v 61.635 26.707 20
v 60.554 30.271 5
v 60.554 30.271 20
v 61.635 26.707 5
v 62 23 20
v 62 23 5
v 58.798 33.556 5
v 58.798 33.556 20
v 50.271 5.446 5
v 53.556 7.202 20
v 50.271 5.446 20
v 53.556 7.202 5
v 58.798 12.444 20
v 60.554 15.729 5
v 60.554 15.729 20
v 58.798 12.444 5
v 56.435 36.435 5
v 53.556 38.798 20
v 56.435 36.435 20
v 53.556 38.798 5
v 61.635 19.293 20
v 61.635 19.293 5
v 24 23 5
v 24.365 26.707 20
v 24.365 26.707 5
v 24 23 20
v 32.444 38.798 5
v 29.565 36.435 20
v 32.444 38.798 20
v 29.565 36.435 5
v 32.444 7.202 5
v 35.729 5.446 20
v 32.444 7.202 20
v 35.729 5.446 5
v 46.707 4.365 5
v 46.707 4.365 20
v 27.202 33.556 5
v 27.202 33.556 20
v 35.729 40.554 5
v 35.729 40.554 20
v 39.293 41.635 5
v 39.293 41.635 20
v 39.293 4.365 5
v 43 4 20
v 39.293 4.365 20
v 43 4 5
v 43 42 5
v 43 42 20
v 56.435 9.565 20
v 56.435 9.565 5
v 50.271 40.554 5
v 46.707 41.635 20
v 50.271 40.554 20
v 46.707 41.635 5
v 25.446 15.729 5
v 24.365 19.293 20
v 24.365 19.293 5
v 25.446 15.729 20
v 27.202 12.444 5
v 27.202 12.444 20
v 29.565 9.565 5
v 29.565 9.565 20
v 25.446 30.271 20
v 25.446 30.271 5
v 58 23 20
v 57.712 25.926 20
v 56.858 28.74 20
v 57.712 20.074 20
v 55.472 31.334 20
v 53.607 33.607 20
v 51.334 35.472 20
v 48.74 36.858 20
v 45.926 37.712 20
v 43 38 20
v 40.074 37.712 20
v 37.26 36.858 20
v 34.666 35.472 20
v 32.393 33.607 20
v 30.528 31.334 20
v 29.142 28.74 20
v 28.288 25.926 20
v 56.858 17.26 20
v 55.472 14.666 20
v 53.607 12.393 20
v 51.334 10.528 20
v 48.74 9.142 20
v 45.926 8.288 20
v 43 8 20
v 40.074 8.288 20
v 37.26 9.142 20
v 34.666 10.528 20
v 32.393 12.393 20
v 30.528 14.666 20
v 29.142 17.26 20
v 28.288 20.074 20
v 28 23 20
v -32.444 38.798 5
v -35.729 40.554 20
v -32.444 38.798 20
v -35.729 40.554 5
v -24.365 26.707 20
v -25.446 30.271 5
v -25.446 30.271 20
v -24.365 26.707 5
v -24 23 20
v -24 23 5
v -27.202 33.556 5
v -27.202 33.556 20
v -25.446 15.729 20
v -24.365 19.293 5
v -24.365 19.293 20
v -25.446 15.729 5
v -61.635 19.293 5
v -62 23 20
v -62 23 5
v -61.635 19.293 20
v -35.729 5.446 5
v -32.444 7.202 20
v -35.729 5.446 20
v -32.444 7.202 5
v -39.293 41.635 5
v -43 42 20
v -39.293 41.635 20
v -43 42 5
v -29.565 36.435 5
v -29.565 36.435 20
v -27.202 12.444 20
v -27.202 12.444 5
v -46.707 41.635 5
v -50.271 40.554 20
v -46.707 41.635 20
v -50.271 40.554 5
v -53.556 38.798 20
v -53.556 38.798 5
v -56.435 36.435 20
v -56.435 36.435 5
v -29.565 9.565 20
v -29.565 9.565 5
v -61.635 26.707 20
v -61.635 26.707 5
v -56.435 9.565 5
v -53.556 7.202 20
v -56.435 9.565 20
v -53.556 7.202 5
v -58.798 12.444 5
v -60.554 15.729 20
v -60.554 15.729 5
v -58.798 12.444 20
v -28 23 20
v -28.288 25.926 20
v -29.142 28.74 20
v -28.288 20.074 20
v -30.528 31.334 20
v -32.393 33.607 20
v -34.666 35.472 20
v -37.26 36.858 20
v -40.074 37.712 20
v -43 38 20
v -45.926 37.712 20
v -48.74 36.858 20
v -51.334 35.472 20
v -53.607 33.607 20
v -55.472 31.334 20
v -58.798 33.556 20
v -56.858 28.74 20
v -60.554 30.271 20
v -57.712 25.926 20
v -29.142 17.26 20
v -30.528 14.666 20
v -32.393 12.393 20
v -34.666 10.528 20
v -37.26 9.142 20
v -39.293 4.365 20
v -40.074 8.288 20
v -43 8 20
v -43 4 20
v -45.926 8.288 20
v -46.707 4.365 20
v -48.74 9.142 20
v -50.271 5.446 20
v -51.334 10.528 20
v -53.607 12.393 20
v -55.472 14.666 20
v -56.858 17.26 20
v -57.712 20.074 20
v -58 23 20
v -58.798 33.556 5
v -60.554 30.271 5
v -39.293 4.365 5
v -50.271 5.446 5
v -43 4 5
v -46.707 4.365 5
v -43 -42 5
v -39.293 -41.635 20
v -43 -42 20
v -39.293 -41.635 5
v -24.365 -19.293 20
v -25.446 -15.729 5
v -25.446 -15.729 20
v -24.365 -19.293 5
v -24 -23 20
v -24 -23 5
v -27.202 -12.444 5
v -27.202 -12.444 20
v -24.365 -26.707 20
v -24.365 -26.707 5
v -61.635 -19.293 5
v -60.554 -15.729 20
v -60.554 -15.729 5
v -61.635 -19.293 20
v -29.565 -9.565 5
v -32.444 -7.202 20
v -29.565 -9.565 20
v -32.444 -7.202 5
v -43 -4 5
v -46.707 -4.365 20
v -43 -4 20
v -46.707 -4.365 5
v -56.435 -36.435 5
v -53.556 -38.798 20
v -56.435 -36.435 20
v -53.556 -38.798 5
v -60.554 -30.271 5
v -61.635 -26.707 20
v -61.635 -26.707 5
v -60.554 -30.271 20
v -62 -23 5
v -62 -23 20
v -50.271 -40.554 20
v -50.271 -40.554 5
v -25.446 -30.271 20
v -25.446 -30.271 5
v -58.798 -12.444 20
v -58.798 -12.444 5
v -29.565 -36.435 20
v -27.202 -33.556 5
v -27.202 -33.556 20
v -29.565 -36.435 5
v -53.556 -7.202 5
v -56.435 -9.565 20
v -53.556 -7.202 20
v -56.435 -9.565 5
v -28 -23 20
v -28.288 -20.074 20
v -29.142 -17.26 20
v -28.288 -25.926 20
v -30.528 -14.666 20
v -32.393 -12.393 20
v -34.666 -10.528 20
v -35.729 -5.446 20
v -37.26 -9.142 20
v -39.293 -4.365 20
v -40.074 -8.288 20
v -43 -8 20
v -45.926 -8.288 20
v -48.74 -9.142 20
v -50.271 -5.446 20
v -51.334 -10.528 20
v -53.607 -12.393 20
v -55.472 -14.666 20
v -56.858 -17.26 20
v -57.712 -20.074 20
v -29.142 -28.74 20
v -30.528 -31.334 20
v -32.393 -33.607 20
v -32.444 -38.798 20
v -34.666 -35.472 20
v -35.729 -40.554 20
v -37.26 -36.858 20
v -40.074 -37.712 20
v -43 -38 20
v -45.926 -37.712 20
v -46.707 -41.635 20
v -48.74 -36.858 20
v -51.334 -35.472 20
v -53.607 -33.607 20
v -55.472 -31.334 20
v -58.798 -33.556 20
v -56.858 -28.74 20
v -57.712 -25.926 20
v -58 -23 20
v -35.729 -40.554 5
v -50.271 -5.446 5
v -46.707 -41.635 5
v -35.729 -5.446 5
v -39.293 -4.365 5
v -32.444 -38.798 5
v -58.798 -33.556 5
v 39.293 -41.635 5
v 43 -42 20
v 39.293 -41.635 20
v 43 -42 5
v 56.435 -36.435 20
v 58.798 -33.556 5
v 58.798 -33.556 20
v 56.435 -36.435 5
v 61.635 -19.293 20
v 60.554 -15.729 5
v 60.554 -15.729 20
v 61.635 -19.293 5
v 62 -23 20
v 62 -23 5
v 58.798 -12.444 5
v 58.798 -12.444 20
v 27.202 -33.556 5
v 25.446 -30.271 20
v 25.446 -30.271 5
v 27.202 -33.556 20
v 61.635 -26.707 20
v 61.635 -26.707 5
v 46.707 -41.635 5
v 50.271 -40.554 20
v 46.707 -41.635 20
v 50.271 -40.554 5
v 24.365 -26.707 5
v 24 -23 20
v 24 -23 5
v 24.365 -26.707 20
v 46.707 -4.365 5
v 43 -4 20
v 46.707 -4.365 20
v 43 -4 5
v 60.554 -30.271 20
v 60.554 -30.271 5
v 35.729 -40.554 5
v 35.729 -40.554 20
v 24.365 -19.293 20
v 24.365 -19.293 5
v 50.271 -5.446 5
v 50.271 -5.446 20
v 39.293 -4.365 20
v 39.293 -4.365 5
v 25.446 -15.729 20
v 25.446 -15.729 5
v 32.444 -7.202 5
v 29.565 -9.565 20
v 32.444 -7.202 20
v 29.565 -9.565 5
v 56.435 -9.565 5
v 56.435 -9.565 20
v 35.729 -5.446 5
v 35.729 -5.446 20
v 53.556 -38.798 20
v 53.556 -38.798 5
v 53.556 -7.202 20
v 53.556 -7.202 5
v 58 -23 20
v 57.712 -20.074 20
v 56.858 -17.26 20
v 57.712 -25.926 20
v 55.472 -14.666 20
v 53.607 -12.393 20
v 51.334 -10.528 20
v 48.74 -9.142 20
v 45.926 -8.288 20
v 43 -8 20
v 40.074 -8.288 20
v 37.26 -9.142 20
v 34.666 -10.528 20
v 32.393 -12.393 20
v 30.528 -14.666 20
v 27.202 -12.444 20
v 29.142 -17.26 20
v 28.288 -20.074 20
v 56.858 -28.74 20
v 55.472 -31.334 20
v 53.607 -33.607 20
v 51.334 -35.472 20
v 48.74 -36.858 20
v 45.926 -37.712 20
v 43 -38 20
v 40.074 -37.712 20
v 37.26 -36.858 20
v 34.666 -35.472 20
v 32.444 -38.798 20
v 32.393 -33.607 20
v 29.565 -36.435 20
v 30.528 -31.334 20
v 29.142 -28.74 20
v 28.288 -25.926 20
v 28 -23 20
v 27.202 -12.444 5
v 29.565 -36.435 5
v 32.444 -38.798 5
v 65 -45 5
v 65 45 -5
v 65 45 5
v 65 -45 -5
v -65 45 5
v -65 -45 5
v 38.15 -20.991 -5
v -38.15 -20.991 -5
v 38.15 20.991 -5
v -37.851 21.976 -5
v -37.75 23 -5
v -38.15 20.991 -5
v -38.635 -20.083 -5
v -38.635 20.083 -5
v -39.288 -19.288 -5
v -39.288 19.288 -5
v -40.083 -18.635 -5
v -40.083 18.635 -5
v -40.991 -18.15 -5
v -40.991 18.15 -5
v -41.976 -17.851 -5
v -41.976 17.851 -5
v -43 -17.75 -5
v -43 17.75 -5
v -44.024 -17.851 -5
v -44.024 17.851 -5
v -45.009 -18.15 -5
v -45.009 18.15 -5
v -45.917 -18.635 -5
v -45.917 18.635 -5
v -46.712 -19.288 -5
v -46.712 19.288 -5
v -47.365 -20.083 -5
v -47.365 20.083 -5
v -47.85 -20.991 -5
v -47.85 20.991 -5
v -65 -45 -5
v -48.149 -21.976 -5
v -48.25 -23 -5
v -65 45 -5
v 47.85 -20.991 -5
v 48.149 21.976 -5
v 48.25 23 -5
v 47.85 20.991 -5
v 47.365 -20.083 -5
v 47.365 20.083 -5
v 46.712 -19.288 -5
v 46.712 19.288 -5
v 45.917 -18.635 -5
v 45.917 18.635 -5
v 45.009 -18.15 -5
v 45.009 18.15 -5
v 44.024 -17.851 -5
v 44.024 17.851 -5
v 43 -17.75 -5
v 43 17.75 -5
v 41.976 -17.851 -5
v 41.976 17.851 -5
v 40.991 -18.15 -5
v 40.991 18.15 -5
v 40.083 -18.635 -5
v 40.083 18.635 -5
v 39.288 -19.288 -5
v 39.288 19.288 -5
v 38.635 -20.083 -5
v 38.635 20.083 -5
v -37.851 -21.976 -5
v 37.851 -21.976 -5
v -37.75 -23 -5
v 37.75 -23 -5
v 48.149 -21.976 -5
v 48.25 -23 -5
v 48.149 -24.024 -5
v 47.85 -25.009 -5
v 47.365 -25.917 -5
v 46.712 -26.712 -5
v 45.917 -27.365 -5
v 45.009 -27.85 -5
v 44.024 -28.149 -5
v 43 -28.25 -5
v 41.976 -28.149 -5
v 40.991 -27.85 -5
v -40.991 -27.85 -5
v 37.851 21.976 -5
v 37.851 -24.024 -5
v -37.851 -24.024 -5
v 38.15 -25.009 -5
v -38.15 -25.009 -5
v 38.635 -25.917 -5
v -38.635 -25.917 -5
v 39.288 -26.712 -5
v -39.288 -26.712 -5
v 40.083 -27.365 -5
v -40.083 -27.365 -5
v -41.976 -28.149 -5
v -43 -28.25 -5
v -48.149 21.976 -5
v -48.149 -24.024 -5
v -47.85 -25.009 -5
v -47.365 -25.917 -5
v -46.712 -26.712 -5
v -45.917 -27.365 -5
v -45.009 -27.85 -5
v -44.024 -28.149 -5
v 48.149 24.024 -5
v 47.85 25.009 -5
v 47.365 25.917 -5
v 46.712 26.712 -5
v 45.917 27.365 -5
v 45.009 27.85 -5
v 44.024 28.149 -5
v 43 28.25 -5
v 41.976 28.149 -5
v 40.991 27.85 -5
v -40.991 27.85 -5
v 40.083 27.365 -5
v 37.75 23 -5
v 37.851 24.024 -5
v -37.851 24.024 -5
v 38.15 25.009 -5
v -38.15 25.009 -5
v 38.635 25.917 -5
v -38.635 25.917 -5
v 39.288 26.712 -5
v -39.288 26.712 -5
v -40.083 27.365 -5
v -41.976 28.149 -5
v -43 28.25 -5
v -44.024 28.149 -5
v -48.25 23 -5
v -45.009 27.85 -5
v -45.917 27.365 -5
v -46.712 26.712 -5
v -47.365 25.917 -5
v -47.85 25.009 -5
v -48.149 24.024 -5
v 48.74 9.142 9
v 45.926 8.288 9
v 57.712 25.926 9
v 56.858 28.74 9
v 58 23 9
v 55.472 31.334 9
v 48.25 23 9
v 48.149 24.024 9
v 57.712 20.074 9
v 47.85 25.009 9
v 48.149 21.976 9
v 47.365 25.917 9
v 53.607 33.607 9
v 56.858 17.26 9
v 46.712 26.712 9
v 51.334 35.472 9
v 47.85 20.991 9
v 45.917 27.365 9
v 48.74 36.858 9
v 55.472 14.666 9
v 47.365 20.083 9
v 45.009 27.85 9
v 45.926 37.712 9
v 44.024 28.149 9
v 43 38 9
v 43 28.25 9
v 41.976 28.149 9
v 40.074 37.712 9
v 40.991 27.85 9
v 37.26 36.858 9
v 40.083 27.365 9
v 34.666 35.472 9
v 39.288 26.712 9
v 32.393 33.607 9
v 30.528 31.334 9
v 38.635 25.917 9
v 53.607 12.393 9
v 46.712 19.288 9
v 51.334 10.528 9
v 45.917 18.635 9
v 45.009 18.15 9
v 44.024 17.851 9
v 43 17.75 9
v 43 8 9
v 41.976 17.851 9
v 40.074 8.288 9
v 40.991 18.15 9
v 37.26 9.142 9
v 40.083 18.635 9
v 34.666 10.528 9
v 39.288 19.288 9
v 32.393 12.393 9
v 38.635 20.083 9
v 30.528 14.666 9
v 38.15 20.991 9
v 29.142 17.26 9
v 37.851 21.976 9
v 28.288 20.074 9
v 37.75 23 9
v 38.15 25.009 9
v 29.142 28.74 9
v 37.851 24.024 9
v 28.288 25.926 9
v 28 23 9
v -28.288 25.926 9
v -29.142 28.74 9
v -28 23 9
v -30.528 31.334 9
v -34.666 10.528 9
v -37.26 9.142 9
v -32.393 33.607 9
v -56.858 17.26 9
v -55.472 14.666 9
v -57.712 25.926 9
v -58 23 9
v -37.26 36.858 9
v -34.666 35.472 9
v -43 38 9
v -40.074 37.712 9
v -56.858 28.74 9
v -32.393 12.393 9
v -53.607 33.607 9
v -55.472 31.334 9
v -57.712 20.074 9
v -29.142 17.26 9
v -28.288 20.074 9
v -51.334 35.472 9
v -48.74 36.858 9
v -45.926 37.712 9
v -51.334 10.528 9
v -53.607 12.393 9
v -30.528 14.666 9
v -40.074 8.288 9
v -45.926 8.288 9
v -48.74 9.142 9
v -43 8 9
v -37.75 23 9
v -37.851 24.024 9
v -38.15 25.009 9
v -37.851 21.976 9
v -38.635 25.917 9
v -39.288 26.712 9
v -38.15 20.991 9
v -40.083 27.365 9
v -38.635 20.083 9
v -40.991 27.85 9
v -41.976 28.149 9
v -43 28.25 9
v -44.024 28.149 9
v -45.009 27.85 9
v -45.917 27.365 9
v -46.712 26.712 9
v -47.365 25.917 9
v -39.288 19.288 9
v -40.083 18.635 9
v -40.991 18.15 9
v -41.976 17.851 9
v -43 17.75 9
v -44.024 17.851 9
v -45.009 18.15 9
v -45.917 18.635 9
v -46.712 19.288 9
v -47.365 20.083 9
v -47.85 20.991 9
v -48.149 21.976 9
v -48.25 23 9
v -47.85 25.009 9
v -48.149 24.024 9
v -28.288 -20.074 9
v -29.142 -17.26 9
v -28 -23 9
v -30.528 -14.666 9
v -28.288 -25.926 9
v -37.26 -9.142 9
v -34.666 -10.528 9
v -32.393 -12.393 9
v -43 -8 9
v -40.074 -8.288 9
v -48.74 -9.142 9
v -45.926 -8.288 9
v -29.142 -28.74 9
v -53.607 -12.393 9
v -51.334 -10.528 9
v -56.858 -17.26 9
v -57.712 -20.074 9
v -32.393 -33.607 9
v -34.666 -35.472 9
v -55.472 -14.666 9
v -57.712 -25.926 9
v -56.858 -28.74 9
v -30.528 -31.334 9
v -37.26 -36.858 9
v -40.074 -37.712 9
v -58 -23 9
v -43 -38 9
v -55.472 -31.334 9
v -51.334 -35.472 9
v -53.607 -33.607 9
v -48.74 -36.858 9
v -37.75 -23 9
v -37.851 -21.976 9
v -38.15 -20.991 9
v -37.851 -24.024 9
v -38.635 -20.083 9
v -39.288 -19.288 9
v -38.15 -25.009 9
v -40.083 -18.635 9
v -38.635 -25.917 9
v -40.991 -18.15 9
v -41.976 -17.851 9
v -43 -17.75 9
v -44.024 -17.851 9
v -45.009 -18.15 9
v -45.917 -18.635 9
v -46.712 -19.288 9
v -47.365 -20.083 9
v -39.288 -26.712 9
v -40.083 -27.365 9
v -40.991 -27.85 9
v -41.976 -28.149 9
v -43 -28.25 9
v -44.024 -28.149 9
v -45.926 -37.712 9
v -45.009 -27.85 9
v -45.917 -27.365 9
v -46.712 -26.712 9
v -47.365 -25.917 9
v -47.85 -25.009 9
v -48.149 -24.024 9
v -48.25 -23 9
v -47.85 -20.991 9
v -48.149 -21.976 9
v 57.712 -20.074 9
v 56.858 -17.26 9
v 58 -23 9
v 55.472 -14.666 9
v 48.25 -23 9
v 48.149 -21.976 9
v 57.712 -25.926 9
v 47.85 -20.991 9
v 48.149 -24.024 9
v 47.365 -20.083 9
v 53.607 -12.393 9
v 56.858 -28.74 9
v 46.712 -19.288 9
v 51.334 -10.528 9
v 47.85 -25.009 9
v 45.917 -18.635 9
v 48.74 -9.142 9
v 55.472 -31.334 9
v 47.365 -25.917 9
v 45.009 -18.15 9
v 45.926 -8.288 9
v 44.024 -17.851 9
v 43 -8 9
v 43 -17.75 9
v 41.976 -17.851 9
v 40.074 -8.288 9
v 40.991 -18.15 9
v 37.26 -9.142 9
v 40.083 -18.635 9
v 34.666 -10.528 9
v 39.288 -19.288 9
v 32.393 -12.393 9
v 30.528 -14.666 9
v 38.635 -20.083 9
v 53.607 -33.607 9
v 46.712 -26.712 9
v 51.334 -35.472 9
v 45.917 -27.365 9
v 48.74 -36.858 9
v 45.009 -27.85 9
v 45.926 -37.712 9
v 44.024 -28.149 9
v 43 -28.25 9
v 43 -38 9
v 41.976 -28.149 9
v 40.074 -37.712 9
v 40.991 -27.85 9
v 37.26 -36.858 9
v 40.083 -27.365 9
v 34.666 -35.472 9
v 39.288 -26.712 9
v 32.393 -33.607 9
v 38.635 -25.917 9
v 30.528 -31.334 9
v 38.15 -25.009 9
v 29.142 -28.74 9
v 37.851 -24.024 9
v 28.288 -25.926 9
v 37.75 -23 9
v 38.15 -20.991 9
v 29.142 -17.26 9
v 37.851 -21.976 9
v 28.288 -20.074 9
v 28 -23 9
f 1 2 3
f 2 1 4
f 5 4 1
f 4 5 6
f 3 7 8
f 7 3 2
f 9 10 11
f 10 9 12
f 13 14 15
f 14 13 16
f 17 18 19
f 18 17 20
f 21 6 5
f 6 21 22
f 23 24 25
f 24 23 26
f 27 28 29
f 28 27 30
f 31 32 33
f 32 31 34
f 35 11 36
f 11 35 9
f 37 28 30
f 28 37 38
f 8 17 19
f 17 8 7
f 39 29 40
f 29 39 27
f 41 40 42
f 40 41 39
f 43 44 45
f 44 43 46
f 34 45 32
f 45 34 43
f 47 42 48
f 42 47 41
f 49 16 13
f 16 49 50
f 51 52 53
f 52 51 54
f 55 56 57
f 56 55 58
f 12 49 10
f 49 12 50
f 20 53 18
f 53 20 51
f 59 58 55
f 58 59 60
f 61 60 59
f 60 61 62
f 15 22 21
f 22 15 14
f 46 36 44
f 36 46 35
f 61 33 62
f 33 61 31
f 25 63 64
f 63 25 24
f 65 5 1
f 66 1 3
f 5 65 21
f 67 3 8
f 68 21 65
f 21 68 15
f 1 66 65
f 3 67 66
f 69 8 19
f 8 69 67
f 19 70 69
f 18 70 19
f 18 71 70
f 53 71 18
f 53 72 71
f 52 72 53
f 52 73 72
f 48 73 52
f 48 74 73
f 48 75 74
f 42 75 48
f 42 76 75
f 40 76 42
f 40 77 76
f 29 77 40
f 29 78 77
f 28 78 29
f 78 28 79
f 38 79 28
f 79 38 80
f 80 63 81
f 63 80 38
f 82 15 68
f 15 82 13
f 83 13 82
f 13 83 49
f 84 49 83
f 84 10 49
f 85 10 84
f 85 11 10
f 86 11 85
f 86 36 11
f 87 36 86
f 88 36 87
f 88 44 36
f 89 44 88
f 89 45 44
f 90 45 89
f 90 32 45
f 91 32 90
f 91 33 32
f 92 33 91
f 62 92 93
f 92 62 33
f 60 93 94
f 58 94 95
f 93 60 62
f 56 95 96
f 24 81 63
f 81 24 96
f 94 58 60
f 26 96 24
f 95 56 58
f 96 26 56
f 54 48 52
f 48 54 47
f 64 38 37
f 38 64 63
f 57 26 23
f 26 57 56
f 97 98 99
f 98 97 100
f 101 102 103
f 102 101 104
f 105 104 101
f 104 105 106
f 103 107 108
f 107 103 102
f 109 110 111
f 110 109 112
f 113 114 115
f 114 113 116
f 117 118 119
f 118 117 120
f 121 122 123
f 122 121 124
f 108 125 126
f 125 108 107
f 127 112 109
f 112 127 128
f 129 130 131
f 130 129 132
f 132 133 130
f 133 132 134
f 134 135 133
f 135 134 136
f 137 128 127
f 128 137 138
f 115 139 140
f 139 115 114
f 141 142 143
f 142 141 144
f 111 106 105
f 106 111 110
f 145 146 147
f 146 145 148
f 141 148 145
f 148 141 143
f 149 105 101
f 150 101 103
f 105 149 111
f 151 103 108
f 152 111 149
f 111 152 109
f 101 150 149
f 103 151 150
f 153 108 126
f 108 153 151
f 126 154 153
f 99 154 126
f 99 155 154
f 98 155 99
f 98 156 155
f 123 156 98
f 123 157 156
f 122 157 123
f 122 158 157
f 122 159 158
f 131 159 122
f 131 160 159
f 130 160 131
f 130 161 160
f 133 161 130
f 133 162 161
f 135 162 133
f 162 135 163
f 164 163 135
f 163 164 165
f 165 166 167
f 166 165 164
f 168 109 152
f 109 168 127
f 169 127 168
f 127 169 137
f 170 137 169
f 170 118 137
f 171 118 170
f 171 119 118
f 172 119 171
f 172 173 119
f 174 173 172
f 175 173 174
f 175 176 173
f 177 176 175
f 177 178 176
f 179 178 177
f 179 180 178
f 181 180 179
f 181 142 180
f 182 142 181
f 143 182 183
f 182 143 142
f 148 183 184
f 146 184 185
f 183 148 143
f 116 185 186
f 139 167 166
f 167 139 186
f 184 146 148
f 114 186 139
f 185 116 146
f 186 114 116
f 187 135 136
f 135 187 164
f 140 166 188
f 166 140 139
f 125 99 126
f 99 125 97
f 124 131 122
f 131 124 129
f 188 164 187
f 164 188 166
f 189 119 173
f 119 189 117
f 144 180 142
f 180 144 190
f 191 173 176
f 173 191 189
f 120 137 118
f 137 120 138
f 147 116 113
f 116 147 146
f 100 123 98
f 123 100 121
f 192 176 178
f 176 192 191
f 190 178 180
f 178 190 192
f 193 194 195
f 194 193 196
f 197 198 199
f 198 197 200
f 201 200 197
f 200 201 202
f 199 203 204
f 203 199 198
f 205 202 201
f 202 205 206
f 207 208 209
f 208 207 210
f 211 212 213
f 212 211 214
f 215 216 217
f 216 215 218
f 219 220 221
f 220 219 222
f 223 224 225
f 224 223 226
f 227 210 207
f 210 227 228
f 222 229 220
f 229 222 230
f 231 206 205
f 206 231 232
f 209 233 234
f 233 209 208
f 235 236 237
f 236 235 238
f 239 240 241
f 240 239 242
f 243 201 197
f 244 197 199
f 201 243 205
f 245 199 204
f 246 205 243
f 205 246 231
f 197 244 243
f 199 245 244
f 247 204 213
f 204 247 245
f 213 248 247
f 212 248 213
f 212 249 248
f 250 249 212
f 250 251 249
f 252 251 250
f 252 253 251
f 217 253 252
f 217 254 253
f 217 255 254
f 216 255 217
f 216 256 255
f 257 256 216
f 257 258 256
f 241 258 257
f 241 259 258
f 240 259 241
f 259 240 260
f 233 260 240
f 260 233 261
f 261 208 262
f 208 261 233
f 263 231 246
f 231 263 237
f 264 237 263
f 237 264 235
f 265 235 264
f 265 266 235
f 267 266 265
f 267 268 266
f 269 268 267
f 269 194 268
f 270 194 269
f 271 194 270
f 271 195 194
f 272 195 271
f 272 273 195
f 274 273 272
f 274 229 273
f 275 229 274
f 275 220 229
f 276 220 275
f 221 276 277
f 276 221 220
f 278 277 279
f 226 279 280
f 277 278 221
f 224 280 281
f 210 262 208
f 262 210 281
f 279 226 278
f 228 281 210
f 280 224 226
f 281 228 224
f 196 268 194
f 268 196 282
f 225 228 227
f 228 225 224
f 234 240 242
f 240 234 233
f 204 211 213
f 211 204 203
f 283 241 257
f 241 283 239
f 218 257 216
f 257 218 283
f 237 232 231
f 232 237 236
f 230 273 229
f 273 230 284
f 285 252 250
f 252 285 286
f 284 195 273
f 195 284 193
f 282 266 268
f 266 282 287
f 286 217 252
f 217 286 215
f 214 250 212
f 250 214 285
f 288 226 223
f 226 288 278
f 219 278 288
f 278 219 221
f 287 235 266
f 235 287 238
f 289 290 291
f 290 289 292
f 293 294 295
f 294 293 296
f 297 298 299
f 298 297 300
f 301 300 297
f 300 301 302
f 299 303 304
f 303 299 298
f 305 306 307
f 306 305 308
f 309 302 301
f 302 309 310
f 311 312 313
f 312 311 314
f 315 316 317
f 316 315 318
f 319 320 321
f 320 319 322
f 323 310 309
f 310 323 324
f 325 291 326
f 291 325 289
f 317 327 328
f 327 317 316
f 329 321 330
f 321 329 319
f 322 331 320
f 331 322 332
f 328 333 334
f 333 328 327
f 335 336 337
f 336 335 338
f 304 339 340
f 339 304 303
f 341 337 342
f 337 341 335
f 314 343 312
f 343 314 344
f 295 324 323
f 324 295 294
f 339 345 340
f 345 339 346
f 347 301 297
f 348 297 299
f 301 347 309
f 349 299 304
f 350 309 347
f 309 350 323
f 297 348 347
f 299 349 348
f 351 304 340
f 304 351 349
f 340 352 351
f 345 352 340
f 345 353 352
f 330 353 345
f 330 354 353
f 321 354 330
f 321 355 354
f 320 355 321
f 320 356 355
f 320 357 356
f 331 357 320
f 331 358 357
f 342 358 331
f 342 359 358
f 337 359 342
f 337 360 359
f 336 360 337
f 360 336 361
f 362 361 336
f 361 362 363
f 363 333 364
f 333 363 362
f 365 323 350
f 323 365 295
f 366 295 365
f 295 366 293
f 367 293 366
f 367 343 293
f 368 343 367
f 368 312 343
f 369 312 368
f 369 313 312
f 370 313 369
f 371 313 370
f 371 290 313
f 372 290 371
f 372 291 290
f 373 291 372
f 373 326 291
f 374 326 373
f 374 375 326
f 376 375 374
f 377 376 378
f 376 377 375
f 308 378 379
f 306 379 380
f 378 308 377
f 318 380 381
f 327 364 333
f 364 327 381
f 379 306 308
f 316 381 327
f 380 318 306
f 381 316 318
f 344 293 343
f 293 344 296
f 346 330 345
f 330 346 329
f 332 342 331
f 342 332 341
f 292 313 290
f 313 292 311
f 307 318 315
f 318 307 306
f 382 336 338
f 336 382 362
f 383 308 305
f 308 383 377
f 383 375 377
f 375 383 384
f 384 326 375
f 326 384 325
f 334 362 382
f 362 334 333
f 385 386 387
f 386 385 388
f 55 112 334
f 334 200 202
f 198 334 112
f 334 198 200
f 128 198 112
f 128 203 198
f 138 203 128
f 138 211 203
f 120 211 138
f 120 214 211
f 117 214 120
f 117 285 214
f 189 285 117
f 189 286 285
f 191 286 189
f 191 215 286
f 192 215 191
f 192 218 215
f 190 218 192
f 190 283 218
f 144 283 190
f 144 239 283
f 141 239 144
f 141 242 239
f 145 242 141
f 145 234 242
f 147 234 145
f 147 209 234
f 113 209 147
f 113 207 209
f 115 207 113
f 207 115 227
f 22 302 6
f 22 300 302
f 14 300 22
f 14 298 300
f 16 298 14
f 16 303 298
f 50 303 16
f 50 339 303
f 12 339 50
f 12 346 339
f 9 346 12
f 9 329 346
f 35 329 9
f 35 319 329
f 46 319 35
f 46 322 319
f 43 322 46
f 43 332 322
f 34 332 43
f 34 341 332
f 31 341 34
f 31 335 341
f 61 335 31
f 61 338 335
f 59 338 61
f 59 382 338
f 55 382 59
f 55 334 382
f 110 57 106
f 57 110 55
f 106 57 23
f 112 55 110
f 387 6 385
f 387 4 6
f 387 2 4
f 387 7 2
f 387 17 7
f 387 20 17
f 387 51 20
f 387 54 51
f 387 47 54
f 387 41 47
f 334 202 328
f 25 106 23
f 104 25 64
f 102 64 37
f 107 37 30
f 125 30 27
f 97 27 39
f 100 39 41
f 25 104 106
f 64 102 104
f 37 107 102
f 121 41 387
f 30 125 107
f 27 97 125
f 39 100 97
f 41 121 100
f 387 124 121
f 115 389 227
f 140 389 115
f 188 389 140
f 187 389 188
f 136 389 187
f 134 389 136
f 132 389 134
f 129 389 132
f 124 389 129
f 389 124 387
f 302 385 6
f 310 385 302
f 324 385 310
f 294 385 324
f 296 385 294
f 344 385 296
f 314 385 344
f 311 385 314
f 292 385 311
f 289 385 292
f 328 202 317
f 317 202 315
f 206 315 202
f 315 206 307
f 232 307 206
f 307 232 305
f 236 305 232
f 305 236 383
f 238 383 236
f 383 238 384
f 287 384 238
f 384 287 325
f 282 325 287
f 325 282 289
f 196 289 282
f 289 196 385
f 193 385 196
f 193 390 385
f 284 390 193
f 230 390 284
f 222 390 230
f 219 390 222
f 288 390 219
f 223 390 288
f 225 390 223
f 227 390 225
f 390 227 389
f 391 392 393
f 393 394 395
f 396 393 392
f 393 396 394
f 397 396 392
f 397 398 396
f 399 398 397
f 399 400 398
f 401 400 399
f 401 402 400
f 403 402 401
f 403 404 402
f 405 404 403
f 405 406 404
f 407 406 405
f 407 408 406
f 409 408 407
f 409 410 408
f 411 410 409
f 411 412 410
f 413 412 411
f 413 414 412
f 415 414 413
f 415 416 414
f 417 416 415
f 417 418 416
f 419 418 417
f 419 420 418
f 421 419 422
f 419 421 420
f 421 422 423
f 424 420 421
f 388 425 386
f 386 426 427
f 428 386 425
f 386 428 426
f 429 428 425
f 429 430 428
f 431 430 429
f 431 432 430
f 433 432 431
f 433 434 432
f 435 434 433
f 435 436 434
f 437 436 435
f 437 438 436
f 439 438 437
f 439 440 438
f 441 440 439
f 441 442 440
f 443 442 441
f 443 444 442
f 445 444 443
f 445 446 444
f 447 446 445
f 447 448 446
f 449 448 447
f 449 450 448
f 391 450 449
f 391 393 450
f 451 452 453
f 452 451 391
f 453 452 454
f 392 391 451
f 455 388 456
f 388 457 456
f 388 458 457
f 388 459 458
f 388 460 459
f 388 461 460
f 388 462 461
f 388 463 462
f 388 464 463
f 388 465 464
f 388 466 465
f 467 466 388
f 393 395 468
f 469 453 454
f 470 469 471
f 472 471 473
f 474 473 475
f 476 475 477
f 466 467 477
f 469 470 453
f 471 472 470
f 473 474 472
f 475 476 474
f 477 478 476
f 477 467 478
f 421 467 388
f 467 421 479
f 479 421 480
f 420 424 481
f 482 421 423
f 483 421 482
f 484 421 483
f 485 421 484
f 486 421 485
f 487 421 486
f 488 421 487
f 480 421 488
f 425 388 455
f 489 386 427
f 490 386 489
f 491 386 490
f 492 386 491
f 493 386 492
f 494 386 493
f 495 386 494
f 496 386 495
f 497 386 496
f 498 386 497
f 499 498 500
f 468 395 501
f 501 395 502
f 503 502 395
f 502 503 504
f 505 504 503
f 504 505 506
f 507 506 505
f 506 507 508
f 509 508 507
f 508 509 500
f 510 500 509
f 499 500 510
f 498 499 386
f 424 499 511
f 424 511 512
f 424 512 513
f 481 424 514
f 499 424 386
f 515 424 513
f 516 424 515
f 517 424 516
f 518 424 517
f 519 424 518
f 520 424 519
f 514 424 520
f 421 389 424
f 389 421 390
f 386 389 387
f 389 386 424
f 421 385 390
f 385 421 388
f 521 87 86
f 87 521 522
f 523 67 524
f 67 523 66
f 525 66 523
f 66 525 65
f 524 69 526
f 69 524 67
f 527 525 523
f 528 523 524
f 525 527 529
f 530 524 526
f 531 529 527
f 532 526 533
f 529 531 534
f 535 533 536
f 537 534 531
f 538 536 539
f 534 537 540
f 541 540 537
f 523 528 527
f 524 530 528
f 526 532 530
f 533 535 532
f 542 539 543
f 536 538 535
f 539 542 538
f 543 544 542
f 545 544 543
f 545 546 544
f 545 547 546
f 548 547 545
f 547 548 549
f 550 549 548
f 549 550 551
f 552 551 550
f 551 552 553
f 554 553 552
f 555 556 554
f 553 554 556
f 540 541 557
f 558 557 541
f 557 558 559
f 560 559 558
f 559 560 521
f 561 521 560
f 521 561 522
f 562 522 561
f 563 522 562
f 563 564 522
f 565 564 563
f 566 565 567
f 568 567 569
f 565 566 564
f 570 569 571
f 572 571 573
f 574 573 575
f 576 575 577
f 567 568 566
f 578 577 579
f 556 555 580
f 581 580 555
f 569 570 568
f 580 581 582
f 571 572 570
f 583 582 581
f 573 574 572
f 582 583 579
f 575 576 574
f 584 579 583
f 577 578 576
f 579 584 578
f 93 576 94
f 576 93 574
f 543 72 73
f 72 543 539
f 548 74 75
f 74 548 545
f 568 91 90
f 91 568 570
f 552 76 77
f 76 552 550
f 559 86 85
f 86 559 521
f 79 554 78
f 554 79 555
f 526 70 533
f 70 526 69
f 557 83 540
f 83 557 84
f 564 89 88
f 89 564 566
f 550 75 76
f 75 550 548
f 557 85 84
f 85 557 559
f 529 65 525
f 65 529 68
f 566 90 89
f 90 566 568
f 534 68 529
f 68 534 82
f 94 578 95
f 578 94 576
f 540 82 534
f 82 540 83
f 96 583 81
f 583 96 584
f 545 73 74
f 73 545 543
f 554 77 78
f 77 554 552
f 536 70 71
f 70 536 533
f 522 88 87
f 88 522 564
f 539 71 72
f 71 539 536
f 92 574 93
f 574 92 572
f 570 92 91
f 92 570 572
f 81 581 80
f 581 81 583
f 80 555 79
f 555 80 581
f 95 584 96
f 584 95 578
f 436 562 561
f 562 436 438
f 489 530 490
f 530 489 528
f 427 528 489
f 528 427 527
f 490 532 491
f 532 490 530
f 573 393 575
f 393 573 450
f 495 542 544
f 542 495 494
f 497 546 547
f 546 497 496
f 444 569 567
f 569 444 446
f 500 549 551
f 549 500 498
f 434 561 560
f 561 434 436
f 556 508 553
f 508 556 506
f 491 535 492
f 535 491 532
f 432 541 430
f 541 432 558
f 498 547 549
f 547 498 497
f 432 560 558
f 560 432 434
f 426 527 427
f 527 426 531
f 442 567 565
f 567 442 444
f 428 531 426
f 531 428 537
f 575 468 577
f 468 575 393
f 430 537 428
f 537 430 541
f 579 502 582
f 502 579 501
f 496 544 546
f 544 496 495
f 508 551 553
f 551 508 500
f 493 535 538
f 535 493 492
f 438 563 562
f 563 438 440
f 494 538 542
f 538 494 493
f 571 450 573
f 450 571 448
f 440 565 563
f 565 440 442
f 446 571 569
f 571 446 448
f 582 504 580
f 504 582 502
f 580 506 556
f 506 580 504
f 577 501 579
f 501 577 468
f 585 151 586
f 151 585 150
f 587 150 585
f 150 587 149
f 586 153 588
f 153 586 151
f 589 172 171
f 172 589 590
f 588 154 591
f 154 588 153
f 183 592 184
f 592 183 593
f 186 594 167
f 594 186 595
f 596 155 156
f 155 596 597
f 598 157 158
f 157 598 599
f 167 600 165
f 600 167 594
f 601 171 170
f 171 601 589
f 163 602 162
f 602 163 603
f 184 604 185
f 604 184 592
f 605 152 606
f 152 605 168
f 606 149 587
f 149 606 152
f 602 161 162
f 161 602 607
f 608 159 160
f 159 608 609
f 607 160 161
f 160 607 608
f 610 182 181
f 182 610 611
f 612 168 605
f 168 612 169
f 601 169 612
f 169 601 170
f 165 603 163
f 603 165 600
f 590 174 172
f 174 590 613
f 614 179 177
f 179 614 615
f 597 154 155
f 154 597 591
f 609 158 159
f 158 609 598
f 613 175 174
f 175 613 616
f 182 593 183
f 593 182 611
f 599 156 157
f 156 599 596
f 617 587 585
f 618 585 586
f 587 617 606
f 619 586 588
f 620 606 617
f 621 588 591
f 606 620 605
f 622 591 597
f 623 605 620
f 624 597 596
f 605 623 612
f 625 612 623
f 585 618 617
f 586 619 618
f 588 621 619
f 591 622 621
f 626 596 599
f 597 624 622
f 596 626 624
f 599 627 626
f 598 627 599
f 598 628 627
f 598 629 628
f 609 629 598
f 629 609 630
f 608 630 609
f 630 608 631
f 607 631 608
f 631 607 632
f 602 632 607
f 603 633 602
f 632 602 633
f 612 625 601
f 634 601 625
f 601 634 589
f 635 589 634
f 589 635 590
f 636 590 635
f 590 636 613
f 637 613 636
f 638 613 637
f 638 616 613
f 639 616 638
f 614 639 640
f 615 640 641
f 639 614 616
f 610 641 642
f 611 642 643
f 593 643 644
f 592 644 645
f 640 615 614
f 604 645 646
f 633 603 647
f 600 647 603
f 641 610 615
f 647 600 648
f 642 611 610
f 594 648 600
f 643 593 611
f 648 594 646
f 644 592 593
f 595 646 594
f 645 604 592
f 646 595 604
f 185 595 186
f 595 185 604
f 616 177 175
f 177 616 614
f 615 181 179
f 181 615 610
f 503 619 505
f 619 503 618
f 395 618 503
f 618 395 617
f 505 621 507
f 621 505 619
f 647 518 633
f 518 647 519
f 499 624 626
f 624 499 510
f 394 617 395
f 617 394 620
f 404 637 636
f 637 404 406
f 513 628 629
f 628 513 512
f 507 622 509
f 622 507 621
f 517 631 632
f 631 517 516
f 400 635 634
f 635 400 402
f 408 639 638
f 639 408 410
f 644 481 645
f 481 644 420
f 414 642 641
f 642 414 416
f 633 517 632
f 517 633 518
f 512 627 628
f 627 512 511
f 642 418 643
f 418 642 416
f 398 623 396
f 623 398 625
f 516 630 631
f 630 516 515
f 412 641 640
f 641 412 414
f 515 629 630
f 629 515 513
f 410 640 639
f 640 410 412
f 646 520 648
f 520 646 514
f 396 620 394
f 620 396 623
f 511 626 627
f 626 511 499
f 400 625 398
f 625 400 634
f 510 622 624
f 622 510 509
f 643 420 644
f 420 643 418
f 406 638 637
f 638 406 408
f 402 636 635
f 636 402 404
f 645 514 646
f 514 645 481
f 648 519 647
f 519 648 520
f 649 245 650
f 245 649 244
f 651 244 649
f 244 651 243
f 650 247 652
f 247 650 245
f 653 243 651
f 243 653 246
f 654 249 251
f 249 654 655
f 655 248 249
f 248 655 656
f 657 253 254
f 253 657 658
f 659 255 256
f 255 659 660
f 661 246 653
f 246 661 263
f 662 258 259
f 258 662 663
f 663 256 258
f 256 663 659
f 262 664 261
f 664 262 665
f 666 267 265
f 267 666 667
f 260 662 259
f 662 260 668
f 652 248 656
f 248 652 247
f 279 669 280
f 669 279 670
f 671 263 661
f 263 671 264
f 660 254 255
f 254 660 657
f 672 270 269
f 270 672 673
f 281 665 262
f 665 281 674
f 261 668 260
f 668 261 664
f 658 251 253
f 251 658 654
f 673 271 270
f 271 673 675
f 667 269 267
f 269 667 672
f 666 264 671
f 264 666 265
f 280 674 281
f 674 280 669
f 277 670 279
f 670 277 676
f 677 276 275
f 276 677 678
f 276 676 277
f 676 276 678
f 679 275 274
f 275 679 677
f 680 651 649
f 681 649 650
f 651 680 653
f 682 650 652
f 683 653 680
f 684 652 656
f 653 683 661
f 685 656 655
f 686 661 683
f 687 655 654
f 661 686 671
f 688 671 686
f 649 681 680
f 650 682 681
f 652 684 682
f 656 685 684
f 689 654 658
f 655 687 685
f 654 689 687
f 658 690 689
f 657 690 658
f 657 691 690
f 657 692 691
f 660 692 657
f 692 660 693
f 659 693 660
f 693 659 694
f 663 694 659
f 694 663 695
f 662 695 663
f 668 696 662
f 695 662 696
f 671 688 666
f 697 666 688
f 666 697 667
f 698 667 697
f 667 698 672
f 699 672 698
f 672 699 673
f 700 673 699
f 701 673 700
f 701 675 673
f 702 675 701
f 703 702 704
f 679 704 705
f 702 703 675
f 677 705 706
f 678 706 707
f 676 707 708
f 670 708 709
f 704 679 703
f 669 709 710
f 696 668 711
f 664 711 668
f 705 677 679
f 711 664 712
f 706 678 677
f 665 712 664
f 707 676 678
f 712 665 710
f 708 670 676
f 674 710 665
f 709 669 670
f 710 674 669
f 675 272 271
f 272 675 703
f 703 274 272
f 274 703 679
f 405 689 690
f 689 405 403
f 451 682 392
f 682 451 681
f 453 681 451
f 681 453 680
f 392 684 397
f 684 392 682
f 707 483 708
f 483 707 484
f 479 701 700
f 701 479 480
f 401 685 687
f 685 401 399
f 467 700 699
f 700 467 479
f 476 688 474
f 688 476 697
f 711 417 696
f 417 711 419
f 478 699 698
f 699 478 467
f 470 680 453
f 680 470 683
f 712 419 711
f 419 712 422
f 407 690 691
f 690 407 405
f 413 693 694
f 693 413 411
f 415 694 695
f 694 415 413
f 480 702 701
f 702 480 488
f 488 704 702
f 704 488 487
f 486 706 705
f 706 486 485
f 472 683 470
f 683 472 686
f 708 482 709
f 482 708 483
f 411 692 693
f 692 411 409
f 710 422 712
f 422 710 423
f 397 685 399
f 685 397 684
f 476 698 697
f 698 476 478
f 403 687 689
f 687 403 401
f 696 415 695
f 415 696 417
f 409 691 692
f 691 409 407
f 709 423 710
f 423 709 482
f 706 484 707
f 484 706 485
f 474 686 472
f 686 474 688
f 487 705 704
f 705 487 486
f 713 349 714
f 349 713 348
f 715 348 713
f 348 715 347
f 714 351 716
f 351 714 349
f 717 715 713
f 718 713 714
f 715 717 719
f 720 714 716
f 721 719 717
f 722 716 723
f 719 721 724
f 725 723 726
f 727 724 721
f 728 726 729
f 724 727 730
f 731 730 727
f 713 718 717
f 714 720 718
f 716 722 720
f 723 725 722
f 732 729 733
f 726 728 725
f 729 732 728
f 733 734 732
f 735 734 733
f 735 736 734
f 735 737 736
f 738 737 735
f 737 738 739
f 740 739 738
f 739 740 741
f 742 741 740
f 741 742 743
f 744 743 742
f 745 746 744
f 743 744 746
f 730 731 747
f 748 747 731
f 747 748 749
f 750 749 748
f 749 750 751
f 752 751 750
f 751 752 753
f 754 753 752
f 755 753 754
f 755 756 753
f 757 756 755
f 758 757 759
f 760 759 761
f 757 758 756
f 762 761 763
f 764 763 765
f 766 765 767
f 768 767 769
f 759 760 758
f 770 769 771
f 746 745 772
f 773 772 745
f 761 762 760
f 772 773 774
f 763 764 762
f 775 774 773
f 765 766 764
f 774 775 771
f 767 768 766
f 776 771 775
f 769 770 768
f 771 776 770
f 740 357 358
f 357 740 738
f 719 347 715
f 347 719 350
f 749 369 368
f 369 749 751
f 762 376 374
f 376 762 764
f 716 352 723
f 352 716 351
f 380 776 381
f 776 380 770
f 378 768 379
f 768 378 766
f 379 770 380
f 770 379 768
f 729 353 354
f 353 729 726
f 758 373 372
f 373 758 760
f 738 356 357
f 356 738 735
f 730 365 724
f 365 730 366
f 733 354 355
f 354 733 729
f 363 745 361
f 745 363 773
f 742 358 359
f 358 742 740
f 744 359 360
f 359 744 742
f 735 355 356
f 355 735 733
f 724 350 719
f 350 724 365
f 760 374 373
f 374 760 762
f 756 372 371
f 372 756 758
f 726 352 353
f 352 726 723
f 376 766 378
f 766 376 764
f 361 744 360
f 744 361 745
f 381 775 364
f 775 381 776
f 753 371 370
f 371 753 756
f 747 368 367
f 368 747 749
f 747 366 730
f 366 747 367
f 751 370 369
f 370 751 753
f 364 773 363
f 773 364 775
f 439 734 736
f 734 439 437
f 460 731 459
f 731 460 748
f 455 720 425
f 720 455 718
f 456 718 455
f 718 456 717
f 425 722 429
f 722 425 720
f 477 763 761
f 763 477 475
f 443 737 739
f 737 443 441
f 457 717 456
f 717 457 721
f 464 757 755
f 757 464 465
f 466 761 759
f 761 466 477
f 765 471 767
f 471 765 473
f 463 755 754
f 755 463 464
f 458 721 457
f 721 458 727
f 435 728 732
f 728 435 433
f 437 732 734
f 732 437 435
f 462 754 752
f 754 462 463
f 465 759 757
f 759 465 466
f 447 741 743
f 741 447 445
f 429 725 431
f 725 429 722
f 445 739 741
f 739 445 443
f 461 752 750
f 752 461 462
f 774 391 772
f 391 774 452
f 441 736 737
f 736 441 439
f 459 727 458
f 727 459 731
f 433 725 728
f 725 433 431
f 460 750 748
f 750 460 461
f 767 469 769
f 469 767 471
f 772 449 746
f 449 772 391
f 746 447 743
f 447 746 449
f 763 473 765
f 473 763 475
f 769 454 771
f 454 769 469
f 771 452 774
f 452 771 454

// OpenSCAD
$fn = 32;

// ----------------------------------------------------------------------
// Socket pad plate
// bosses with counterbored sockets for the screws
// ----------------------------------------------------------------------

// --- parameters (mm) ---
base_t = 10;            // base plate thickness
boss_h = 15;            // boss height above the base plate
boss_d = 38;            // boss diameter
socket_d = 30;          // socket diameter
socket_depth = 11;      // socket depth from the boss face
bolt_d = 10.5;          // screw clearance hole through the socket floor
plate = [130, 90, 10];  // overall size (x, y, z)
edge = 22;              // boss centre offset from the plate edge
pads = 4;               // boss count, one per corner

// --- derived feature positions (mm) ---
height = base_t + boss_h;        // = 25   overall height of the part
corner_x = plate[0] / 2 - edge;  // = 43   boss centre X
corner_y = plate[1] / 2 - edge;  // = 23   boss centre Y
feature_centers = [
  [corner_x, corner_y],
  [-corner_x, corner_y],
  [-corner_x, -corner_y],
  [corner_x, -corner_y]
];   // boss centres: sockets, holes and the pads themselves are placed from here

// base plate, bosses on feature_centers, socket + through hole in each
difference() {
  union() {
    cube(plate, center = true);
    for (centre = feature_centers)
      translate([centre[0], centre[1], plate[2] / 2 - 1])
        cylinder(d = boss_d, h = boss_h + 1);
  }
  for (centre = feature_centers) {
    translate([centre[0], centre[1], plate[2] / 2 + boss_h - socket_depth])
      cylinder(d = socket_d, h = socket_depth + 1);
    translate([centre[0], centre[1], -height])
      cylinder(d = bolt_d, h = 2 * height + 2);  // through the socket floor
  }
}
